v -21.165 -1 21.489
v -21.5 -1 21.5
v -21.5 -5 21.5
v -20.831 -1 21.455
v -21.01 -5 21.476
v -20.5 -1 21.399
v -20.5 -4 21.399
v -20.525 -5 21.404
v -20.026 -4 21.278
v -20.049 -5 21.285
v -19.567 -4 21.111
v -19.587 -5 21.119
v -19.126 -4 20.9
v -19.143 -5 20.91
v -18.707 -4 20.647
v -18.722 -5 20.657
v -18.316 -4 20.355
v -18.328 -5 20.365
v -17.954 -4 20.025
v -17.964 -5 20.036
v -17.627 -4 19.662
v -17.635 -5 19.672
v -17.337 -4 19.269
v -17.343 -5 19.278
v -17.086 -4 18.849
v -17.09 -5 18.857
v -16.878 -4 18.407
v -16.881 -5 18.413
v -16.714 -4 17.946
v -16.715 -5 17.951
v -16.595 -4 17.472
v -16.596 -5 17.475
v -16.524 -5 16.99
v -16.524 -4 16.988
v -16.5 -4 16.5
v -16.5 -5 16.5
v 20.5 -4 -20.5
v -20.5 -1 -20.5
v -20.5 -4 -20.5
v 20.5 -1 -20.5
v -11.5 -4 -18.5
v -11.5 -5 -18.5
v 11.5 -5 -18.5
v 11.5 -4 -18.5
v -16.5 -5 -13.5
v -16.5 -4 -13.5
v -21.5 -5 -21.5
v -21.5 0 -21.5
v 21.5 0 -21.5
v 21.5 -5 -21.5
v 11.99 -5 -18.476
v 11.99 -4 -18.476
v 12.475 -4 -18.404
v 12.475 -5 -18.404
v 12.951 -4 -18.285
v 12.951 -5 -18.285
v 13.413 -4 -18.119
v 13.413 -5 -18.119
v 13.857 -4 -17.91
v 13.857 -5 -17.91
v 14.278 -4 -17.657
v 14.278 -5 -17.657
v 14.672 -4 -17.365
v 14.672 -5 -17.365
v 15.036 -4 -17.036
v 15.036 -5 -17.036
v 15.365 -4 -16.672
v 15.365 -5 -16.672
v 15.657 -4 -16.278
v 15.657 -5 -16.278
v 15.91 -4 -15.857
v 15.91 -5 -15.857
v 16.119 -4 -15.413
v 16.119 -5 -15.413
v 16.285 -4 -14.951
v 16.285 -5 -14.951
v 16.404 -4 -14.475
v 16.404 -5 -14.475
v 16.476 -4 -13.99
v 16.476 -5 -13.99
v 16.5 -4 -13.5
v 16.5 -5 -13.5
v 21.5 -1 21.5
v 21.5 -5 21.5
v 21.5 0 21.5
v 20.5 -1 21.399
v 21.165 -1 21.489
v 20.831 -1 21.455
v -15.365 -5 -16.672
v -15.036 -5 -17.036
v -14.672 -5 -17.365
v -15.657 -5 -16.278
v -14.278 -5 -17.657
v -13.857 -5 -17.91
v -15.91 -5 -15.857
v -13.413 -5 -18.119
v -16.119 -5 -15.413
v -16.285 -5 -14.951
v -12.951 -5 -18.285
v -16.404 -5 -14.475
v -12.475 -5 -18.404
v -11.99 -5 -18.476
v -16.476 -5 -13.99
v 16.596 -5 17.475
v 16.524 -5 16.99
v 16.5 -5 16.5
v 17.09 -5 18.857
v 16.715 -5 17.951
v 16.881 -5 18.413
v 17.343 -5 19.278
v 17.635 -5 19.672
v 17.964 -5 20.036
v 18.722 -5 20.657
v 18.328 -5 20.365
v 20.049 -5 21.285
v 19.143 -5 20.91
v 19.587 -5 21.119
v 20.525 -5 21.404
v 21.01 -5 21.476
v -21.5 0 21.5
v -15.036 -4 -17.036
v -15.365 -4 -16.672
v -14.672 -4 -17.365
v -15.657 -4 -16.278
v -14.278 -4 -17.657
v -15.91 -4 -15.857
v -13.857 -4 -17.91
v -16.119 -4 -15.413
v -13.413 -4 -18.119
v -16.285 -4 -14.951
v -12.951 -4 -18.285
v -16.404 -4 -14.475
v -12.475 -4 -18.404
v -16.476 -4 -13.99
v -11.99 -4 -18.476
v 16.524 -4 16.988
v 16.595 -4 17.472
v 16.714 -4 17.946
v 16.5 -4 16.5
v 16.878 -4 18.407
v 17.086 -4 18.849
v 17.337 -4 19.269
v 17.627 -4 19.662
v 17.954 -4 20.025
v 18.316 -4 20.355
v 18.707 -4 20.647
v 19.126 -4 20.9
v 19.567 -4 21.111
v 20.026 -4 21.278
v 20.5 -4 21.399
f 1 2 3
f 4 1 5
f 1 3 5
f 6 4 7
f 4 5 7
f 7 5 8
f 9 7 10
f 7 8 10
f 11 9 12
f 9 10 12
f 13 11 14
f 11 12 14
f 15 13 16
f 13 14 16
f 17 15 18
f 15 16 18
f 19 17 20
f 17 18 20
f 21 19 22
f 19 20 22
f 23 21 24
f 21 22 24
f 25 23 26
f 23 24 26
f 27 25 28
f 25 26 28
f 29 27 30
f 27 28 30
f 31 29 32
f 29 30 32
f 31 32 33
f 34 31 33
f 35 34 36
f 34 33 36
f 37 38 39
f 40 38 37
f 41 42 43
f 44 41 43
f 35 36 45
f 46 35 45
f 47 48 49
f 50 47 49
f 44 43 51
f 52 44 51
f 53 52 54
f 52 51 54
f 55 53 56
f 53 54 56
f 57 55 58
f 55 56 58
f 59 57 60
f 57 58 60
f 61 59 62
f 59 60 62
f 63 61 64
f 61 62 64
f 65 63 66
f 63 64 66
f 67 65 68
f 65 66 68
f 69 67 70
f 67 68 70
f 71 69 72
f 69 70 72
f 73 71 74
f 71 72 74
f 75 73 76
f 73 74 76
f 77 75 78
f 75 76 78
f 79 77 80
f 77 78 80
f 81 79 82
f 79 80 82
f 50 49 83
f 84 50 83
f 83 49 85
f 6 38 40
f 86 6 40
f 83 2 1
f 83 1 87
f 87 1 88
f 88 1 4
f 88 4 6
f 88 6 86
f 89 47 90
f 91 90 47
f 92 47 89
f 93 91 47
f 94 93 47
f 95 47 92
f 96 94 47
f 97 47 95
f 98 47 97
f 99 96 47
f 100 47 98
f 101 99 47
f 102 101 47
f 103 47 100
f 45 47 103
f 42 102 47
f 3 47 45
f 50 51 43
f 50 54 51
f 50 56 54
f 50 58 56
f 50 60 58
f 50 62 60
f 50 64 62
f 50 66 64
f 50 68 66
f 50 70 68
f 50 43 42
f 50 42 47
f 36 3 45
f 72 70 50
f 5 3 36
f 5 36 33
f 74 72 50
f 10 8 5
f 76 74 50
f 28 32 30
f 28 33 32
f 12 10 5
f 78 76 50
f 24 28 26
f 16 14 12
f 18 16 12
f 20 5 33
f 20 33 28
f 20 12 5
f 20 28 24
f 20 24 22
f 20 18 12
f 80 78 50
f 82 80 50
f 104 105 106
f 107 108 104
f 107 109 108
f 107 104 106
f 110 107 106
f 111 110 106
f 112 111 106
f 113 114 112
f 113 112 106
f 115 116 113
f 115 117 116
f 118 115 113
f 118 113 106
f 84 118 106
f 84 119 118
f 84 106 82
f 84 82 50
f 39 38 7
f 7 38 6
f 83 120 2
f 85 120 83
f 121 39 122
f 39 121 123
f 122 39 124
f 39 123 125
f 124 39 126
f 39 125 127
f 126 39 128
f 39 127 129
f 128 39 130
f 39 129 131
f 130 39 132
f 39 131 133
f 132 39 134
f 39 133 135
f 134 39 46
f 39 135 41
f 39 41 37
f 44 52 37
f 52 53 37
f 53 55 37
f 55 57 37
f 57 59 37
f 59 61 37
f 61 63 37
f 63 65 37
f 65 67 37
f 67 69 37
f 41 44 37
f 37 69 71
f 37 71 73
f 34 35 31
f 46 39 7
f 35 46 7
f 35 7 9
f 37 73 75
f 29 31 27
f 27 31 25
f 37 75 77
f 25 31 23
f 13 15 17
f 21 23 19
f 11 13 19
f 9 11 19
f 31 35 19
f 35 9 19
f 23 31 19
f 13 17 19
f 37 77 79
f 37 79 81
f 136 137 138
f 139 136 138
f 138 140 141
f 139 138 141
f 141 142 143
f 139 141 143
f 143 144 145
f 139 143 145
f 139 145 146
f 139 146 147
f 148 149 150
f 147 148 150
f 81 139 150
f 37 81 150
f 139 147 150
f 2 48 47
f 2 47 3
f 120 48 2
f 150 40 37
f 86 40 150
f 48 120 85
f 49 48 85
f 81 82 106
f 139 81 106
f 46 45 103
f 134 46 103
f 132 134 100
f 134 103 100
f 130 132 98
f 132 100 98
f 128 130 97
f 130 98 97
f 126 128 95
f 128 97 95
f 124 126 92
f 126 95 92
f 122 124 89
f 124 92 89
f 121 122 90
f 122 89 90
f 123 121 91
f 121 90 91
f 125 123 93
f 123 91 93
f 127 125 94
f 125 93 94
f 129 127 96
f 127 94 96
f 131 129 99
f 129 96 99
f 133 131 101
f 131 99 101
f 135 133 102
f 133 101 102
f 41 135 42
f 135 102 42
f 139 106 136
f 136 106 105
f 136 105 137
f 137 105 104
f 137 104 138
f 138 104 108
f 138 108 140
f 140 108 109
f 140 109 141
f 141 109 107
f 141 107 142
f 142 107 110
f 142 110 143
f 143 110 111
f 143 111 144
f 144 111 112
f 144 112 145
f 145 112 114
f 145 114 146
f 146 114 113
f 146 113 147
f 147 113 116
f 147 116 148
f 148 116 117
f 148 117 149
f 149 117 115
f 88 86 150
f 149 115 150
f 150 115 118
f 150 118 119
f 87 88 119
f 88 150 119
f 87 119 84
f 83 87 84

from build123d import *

# Parameters (mm, degrees)
F0_W     = 43
F0_H     = 43
F1_DEPTH = 5
F2_T     = -1
F4_DEPTH = 4


with BuildPart() as f1:
    # F0 (on Front) → F1 (new body)
    with BuildSketch(Plane.XZ):
        Rectangle(F0_W, F0_H)
    extrude(amount=F1_DEPTH)

    # F2
    f2_openings = [f1.faces().sort_by_distance(p)[0] for p in [
        (0, -2.5, 21.5),
    ]]
    offset(amount=F2_T, openings=f2_openings)

    # F3 (on face) → F4 (cut, through all)
    with BuildSketch(Plane.XZ.offset(5)):
        with BuildLine():
            ThreePointArc((-21.5, 21.5), (-17.9644660941, 20.0355339059), (-16.5, 16.5))
            Line((-16.5, 16.5), (-16.5, -13.5))
            ThreePointArc((-16.5, -13.5), (-15.0355339059, -17.0355339059), (-11.5, -18.5))
            Line((-11.5, -18.5), (11.5, -18.5))
            ThreePointArc((11.5, -18.5), (15.0355339059, -17.0355339059), (16.5, -13.5))
            Line((16.5, -13.5), (16.5, 16.5))
            ThreePointArc((16.5, 16.5), (17.9644660941, 20.0355339059), (21.5, 21.5))
            Line((21.5, 21.5), (-21.5, 21.5))
        make_face()
    extrude(amount=-F4_DEPTH, mode=Mode.SUBTRACT)


solid = f1.part
